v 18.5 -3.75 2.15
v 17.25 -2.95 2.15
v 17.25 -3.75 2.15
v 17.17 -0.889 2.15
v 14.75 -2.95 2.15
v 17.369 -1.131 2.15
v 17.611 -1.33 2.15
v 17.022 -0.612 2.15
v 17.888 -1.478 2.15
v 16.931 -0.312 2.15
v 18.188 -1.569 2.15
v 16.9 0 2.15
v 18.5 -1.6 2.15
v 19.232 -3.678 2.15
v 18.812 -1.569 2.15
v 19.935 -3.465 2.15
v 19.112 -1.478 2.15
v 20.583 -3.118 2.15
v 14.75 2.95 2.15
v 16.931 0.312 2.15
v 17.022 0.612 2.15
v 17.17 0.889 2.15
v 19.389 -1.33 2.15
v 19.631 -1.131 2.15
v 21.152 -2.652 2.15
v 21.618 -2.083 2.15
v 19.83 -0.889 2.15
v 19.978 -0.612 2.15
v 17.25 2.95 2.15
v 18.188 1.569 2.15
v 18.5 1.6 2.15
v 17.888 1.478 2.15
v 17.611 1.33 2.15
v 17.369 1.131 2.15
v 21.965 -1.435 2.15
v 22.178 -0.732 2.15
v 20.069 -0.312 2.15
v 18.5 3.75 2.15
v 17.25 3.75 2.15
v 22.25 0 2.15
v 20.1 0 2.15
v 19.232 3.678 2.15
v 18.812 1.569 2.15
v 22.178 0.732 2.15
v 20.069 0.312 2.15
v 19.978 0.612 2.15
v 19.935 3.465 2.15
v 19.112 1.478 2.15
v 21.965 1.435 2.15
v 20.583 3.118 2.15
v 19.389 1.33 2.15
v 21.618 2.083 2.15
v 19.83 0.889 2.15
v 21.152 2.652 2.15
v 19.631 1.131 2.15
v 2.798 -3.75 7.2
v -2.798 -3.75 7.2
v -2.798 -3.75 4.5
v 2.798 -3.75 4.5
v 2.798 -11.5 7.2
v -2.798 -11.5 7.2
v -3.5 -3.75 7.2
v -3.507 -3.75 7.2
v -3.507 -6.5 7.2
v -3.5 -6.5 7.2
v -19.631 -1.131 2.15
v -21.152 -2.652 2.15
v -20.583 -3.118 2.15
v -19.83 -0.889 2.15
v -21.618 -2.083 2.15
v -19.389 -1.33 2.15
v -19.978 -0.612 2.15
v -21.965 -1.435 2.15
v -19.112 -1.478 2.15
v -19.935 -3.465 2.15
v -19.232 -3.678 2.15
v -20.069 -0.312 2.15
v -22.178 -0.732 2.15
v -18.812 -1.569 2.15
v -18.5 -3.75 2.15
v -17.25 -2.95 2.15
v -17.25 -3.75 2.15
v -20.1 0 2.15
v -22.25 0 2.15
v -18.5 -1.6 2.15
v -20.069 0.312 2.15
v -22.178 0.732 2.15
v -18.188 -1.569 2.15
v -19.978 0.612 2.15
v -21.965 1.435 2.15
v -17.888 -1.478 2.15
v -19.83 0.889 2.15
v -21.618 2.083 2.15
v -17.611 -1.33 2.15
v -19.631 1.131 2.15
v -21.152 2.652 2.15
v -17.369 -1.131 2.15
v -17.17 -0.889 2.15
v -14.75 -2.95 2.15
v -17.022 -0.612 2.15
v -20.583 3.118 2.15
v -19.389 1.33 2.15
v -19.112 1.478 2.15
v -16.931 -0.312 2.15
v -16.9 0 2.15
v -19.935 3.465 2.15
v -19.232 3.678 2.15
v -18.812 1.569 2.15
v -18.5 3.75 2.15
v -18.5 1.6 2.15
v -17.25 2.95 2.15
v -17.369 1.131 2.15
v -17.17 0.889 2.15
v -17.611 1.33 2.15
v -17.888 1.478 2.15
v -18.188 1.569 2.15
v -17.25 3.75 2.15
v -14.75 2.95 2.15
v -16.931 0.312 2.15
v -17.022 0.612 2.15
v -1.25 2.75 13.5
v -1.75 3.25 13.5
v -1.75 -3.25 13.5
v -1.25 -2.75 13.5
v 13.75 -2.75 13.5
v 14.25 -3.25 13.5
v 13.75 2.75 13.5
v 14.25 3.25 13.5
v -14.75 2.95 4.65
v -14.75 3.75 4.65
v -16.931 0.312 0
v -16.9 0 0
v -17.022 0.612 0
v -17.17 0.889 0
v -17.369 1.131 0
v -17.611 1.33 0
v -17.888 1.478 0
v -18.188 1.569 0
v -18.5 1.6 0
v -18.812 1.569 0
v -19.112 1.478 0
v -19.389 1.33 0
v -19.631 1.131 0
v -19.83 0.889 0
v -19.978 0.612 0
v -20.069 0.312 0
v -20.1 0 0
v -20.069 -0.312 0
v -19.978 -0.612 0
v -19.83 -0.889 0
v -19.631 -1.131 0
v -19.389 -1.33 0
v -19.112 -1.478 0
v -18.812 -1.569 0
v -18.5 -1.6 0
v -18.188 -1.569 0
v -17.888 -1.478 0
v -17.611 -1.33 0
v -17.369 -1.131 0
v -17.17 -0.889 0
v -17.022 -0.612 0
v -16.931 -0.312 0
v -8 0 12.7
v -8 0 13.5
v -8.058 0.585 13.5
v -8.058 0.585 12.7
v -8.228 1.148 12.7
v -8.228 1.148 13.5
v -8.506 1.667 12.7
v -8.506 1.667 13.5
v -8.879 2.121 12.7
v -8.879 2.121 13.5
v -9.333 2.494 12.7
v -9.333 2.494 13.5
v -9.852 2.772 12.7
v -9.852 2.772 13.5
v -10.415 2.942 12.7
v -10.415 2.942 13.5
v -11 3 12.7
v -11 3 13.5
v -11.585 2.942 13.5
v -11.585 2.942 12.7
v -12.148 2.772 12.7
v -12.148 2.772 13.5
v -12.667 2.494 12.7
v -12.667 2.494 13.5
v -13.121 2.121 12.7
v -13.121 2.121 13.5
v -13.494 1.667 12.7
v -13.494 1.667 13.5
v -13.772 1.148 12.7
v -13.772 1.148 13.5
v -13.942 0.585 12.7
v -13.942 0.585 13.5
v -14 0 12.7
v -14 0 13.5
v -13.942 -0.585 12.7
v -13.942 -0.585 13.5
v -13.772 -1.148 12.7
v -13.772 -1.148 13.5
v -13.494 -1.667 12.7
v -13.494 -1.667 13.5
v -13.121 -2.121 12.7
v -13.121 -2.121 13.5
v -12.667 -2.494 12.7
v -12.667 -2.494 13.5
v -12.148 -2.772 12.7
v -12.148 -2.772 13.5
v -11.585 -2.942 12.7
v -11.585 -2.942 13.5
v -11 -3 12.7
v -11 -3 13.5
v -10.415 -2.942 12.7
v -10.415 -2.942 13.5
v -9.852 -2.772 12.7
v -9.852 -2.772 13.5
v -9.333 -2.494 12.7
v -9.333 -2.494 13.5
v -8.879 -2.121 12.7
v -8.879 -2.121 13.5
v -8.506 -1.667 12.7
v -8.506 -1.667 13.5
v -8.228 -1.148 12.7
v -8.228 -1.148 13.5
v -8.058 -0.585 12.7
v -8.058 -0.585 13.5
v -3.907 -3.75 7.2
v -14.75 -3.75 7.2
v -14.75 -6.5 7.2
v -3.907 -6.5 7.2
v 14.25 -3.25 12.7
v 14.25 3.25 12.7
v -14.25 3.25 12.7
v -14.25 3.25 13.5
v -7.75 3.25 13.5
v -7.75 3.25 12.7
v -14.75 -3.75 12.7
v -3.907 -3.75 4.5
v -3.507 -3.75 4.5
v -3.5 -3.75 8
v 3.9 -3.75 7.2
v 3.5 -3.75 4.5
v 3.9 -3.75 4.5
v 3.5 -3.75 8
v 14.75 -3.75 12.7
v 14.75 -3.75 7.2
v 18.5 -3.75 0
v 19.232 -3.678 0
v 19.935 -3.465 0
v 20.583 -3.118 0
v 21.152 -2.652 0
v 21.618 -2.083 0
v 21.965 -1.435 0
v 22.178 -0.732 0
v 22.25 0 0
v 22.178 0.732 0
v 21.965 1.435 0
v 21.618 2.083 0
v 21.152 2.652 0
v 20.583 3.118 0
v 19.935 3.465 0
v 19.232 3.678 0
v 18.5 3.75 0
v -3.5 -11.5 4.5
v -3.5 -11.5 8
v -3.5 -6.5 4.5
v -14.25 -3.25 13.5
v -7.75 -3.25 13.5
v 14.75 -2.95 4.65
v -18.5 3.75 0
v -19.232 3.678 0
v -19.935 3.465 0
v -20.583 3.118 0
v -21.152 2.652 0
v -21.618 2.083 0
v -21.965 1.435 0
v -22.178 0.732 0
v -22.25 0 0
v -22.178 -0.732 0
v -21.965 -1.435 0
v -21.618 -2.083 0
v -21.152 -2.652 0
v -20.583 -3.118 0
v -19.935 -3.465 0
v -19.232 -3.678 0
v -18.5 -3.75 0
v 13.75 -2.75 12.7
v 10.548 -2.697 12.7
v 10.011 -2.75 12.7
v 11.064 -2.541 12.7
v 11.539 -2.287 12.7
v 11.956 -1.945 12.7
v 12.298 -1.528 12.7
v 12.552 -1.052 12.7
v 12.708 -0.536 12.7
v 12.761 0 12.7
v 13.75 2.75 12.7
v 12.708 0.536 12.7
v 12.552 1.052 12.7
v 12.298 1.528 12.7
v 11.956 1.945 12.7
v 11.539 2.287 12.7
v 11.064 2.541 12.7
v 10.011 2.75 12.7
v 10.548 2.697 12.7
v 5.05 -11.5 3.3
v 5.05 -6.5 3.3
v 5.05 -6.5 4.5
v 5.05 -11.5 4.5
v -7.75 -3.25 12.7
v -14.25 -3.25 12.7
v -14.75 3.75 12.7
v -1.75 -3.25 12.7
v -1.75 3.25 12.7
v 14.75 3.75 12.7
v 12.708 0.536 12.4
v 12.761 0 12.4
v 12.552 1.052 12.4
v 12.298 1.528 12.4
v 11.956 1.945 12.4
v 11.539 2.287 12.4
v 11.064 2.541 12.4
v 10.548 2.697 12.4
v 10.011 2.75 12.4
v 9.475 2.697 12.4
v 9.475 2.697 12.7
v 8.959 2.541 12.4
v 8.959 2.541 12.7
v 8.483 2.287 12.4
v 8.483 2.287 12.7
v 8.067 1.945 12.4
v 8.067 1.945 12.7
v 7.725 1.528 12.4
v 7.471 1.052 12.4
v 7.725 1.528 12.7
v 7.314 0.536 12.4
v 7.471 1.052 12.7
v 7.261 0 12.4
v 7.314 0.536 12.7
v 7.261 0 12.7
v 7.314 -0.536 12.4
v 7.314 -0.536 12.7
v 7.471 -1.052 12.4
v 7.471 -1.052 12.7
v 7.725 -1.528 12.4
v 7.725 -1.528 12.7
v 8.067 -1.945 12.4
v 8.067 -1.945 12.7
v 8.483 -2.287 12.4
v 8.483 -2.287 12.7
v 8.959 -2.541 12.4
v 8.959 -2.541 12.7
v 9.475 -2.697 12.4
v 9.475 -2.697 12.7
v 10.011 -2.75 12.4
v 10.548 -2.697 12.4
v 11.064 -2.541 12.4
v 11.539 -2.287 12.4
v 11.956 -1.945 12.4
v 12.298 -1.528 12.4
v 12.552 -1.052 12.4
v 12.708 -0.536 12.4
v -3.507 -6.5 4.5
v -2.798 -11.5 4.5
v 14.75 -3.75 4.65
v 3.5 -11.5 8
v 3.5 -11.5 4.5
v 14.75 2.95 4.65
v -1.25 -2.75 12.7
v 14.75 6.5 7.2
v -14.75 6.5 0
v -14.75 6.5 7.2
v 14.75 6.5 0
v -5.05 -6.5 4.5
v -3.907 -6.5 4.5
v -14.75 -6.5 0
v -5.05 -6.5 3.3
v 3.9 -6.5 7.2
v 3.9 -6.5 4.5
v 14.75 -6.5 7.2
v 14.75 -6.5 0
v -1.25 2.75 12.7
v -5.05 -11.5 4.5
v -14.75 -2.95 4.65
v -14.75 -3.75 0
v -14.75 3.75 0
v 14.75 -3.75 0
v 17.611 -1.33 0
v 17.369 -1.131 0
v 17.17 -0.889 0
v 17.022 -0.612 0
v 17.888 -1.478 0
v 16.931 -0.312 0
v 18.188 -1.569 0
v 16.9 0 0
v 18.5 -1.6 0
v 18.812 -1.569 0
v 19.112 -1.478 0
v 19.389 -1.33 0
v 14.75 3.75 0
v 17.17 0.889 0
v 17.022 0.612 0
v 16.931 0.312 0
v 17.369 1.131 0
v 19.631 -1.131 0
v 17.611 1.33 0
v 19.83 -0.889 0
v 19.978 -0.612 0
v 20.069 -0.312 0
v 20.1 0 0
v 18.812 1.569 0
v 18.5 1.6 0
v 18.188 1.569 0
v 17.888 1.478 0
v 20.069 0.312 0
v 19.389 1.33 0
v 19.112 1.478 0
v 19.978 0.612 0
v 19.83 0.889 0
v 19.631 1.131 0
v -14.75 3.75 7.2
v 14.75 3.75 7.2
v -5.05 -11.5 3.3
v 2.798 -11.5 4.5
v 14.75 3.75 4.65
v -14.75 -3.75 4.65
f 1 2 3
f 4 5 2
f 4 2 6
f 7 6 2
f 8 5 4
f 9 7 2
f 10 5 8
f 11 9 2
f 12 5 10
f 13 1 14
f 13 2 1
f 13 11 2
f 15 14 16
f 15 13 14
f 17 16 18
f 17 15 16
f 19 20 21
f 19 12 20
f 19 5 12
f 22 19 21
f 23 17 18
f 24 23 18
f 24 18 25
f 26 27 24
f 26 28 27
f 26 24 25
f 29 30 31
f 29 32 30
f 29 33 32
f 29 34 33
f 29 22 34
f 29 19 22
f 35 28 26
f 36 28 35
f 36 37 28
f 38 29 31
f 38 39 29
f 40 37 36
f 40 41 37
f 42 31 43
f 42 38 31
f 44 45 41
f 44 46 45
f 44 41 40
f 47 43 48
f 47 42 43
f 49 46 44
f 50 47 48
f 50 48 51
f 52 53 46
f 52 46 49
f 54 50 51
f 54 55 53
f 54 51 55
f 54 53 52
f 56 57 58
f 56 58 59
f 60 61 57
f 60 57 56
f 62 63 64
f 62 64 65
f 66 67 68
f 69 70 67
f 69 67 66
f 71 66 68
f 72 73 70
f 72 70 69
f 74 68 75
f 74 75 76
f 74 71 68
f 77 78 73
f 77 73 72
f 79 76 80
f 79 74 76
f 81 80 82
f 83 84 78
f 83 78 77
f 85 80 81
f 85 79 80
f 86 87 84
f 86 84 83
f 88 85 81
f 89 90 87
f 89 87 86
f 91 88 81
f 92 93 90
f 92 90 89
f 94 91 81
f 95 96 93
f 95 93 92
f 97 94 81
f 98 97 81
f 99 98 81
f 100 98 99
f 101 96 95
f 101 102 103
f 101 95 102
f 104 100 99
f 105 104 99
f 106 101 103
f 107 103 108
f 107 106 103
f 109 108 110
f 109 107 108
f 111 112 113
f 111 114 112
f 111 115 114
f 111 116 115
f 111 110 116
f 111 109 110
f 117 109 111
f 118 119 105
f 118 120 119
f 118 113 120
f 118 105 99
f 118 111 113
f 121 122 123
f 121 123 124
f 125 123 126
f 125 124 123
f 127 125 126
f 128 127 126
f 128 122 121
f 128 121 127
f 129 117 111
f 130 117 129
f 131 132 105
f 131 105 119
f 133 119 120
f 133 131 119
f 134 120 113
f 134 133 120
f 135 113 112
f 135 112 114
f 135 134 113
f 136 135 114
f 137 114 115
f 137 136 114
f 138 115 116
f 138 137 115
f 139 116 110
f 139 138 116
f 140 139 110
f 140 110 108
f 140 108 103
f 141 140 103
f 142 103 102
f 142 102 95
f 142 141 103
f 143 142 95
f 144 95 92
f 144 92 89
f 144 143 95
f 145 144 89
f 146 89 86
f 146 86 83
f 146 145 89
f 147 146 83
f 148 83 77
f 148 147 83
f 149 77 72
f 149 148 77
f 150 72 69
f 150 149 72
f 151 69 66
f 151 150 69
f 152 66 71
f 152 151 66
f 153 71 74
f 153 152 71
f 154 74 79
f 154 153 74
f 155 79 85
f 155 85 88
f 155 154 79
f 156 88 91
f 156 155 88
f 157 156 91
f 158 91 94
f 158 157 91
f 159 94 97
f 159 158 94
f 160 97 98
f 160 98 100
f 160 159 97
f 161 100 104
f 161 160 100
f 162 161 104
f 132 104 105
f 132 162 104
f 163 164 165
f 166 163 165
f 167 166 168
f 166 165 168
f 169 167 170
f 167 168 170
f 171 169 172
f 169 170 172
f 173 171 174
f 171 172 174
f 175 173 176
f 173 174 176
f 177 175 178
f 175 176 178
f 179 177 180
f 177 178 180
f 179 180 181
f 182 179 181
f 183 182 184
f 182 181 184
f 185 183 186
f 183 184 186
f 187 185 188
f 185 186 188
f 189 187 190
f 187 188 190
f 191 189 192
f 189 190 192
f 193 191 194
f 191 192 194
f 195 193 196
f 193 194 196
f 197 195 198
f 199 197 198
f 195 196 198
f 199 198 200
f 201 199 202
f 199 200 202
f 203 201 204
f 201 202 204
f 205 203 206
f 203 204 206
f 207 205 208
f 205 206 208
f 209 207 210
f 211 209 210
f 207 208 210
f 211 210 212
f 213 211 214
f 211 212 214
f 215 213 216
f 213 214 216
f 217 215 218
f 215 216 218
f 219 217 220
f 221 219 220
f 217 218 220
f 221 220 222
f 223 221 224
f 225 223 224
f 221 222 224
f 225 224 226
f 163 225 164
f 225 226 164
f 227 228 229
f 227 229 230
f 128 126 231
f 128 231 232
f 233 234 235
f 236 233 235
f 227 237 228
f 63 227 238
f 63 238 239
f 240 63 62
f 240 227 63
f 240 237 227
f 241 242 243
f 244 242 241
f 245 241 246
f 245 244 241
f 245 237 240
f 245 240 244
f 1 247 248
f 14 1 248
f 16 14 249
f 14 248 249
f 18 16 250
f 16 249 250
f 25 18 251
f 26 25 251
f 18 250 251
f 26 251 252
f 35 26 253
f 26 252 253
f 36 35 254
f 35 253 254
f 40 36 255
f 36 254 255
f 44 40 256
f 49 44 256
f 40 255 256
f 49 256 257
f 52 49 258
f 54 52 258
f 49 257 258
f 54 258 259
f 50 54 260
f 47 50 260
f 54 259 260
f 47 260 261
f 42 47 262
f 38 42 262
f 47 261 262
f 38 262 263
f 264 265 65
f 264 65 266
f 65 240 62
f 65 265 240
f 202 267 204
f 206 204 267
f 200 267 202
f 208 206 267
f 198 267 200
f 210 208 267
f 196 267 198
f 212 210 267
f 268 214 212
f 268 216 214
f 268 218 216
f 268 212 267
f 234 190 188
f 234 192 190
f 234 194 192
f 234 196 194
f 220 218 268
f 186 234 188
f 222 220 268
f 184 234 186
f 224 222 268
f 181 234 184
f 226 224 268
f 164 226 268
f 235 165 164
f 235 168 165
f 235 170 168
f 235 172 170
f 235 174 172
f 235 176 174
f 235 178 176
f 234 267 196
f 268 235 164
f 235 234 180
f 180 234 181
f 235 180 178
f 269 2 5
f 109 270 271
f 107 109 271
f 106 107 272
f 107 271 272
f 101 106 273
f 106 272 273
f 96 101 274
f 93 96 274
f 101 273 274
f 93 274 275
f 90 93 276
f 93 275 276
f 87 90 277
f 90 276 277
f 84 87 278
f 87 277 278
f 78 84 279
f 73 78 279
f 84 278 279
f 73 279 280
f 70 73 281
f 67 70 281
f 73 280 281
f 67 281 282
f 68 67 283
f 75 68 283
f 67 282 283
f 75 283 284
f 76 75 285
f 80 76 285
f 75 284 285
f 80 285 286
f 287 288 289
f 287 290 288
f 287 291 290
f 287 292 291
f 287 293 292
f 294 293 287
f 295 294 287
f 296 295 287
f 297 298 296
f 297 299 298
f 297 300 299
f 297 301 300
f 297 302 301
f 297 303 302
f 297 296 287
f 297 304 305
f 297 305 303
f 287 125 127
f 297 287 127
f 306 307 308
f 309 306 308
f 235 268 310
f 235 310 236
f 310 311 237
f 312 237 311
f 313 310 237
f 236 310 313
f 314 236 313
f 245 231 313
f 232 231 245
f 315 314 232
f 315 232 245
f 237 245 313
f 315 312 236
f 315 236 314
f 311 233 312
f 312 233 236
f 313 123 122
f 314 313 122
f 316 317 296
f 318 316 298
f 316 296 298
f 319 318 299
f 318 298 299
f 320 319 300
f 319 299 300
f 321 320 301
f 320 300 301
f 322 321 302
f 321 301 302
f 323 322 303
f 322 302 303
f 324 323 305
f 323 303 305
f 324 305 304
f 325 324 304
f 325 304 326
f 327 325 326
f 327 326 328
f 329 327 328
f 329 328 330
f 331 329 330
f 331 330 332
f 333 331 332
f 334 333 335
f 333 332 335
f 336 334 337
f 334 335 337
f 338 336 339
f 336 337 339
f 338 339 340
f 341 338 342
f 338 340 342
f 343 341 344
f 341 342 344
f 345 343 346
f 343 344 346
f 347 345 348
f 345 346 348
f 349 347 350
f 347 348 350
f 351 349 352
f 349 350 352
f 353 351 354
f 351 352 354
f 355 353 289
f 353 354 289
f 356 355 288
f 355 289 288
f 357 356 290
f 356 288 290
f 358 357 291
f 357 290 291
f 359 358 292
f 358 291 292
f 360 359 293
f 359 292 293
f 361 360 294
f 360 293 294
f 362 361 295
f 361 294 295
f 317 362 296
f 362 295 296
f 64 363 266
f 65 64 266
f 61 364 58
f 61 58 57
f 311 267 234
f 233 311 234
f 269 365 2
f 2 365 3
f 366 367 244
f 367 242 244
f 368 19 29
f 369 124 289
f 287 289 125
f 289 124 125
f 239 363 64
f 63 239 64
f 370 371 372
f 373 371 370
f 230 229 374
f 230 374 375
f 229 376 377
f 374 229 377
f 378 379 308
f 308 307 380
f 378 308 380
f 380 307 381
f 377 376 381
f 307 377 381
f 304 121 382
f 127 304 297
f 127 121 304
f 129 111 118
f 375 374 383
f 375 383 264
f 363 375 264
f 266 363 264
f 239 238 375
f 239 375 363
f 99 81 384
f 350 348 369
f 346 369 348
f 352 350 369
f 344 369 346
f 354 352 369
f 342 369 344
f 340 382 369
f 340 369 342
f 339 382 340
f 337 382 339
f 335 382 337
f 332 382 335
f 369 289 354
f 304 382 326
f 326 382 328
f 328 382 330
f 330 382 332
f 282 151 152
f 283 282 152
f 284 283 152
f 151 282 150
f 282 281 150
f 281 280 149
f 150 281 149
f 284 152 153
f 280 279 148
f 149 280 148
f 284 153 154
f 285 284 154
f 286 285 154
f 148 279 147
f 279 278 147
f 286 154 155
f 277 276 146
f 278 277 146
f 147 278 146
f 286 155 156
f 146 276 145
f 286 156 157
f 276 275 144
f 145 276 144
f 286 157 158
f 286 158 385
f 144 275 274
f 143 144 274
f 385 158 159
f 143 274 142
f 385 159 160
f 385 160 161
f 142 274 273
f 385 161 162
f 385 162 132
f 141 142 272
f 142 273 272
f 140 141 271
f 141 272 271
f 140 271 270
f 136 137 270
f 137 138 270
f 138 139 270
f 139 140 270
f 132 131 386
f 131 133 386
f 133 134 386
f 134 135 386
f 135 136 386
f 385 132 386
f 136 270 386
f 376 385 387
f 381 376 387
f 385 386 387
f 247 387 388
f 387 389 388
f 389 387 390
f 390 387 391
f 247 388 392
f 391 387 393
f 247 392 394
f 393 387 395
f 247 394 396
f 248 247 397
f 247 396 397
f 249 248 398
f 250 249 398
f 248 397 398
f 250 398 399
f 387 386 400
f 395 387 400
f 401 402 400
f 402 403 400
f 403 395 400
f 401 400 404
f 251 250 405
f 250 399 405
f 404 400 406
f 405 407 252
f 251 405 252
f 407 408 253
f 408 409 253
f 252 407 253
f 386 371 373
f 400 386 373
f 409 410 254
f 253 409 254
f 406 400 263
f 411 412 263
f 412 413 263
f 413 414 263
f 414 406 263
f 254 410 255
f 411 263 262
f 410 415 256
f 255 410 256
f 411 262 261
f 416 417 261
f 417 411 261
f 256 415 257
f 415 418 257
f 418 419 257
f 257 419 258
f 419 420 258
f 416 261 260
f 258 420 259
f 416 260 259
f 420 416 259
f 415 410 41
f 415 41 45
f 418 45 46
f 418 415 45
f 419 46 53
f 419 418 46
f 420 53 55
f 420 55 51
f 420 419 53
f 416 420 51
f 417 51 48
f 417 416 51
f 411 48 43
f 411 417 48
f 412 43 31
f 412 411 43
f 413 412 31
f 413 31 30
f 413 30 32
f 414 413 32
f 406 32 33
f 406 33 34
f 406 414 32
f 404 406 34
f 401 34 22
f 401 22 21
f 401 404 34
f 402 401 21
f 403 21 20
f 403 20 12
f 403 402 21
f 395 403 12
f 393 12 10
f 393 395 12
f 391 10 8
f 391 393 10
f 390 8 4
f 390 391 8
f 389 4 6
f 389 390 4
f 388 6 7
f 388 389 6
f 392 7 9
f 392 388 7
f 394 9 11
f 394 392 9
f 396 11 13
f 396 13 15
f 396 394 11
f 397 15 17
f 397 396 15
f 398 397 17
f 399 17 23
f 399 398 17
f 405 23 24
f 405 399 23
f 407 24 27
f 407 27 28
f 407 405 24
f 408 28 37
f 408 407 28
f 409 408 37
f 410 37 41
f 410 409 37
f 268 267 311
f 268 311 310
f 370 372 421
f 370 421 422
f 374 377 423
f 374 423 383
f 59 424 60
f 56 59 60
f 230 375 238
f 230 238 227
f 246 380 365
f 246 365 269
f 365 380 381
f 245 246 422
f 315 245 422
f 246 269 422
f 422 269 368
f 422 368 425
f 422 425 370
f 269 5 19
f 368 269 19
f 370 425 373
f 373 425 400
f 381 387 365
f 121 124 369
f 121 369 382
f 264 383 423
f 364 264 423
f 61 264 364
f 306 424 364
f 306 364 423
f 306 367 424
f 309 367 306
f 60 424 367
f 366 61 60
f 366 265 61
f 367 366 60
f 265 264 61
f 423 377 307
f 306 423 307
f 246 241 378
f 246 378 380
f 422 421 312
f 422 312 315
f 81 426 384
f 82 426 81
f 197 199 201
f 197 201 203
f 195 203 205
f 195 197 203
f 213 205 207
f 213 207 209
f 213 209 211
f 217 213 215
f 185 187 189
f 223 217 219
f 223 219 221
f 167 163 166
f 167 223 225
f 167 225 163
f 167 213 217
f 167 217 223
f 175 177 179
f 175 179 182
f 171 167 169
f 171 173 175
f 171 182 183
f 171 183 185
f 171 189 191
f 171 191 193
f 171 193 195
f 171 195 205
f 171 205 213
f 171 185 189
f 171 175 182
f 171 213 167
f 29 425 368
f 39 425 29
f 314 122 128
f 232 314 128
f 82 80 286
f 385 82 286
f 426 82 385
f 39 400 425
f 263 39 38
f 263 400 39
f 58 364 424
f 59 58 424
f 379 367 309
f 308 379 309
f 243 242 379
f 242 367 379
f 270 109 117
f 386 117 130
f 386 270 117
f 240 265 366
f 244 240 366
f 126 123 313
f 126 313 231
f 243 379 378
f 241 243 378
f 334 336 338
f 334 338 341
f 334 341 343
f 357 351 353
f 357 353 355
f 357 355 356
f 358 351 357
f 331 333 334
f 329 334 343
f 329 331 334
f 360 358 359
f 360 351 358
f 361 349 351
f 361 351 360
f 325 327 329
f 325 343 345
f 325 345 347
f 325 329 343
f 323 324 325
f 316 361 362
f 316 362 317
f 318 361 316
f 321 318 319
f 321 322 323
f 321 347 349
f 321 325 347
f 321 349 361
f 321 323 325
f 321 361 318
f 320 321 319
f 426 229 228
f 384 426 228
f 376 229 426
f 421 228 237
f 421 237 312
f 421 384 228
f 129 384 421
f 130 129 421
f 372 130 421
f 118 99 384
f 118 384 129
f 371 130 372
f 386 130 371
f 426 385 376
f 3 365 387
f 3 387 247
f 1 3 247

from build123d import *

# Parameters (mm, degrees)
SKETCH_1_W          = 29.5
SKETCH_1_H          = 7.5
EXTRUDE_1_DEPTH     = 13.5
SKETCH_1_4_R        = 1.6
EXTRUDE_2_DEPTH     = 2.15
EXTRUDE_3_DEPTH     = 0.8
EXTRUDE_4_DEPTH     = 0.8
SKETCH_4_W          = 29.5
SKETCH_4_H          = 7.5
SKETCH_4_W_2        = 6.5
SKETCH_4_H_2        = 6.5
SKETCH_4_W_3        = 16
SKETCH_4_W_4        = 15
SKETCH_4_H_3        = 5.5
SKETCH_4_R          = 3
CUT_EXTRUDE_1_DEPTH = 0.8
SKETCH_7_W          = 29.5
SKETCH_7_H          = 13
EXTRUDE_5_DEPTH     = 7.2
SKETCH_10_W         = 10.1
SKETCH_10_H         = 1.2
SKETCH_10_W_2       = 7
SKETCH_10_H_2       = 2.7
SKETCH_10_H_3       = 0.8
EXTRUDE_7_DEPTH     = 7.75
SKETCH_11_W         = 5.595198372
SKETCH_11_H         = 2.7
SKETCH_11_W_2       = 0.4
CUT_EXTRUDE_2_DEPTH = 7.75
SKETCH_12_R         = 2.75
CUT_EXTRUDE_3_DEPTH = 0.3


with BuildPart() as part:
    # 草图1 → 凸台-拉伸1 (new body)
    with BuildSketch(Plane.XY):
        Rectangle(SKETCH_1_W, SKETCH_1_H)
    extrude(amount=EXTRUDE_1_DEPTH)

    # 草图1<4> → 凸台-拉伸2 (add)
    with BuildSketch(Plane.XY):
        with BuildLine():
            Line((-18.5, -3.75), (-14.75, -3.75))
            Line((-14.75, -3.75), (-14.75, 3.75))
            Line((-14.75, 3.75), (-18.5, 3.75))
            ThreePointArc((-18.5, 3.75), (-22.25, 0), (-18.5, -3.75))
        make_face()
        with Locations((-18.5, 0)):
            Circle(SKETCH_1_4_R, mode=Mode.SUBTRACT)
        with BuildLine():
            Line((14.75, -3.75), (18.5, -3.75))
            ThreePointArc((18.5, -3.75), (22.25, 0), (18.5, 3.75))
            Line((18.5, 3.75), (14.75, 3.75))
            Line((14.75, 3.75), (14.75, -3.75))
        make_face()
        with Locations((18.5, 0)):
            Circle(SKETCH_1_4_R, mode=Mode.SUBTRACT)
    extrude(amount=EXTRUDE_2_DEPTH)

    # 草图2 → 凸台-拉伸3 (add)
    with BuildSketch(Plane.XZ.offset(3.75)):
        Polygon((-14.75, 4.65), (-17.25, 2.15), (-14.75, 2.15), align=None)
        Polygon((14.75, 4.65), (17.25, 2.15), (14.75, 2.15), align=None)
    extrude(amount=-EXTRUDE_3_DEPTH)

    # 草图3 → 凸台-拉伸4 (add)
    with BuildSketch(Plane(origin=(0, 3.75, 0), x_dir=(1, 0, 0), z_dir=(0, 1, 0))):
        Polygon((17.25, -2.15), (14.75, -2.15), (14.75, -4.65), align=None)
        Polygon((-14.75, -4.65), (-14.75, -2.15), (-17.25, -2.15), align=None)
    extrude(amount=-EXTRUDE_4_DEPTH)

    # 草图4 → 切除-拉伸1 (cut)
    with BuildSketch(Plane.XY.offset(13.5)):
        Rectangle(SKETCH_4_W, SKETCH_4_H)
        with Locations((-11, 0)):
            Rectangle(SKETCH_4_W_2, SKETCH_4_H_2, mode=Mode.SUBTRACT)
        with Locations((6.25, 0)):
            Rectangle(SKETCH_4_W_3, SKETCH_4_H_2, mode=Mode.SUBTRACT)
        with Locations((6.25, 0)):
            Rectangle(SKETCH_4_W_4, SKETCH_4_H_3)
        with Locations((-11, 0)):
            Circle(SKETCH_4_R)
    extrude(amount=-CUT_EXTRUDE_1_DEPTH, mode=Mode.SUBTRACT)

    # 草图7 → 凸台-拉伸5 (add)
    with BuildSketch(Plane.XY):
        Rectangle(SKETCH_7_W, SKETCH_7_H)
    extrude(amount=EXTRUDE_5_DEPTH)

    # 草图10 → 凸台-拉伸7 (add)
    with BuildSketch(Plane.XZ.offset(3.75)):
        with Locations((0, 3.9)):
            Rectangle(SKETCH_10_W, SKETCH_10_H)
        with Locations((0, 5.85)):
            Rectangle(SKETCH_10_W_2, SKETCH_10_H_2)
        with Locations((0, 7.6)):
            Rectangle(SKETCH_10_W_2, SKETCH_10_H_3)
    extrude(amount=EXTRUDE_7_DEPTH)

    # 草图11 → 切除-拉伸2 (cut)
    with BuildSketch(Plane.XZ.offset(11.5)):
        with Locations((0, 5.85)):
            Rectangle(SKETCH_11_W, SKETCH_11_H)
        with Locations((3.7, 5.85)):
            Rectangle(SKETCH_11_W_2, SKETCH_11_H)
        with Locations((-3.707390598, 5.85)):
            Rectangle(SKETCH_11_W_2, SKETCH_11_H)
    extrude(amount=-CUT_EXTRUDE_2_DEPTH, mode=Mode.SUBTRACT)

    # 草图12 → 切除-拉伸3 (cut)
    with BuildSketch(Plane.XY.offset(12.7)):
        with Locations((10.011243367, 0)):
            Circle(SKETCH_12_R)
    extrude(amount=-CUT_EXTRUDE_3_DEPTH, mode=Mode.SUBTRACT)


solid = part.part
